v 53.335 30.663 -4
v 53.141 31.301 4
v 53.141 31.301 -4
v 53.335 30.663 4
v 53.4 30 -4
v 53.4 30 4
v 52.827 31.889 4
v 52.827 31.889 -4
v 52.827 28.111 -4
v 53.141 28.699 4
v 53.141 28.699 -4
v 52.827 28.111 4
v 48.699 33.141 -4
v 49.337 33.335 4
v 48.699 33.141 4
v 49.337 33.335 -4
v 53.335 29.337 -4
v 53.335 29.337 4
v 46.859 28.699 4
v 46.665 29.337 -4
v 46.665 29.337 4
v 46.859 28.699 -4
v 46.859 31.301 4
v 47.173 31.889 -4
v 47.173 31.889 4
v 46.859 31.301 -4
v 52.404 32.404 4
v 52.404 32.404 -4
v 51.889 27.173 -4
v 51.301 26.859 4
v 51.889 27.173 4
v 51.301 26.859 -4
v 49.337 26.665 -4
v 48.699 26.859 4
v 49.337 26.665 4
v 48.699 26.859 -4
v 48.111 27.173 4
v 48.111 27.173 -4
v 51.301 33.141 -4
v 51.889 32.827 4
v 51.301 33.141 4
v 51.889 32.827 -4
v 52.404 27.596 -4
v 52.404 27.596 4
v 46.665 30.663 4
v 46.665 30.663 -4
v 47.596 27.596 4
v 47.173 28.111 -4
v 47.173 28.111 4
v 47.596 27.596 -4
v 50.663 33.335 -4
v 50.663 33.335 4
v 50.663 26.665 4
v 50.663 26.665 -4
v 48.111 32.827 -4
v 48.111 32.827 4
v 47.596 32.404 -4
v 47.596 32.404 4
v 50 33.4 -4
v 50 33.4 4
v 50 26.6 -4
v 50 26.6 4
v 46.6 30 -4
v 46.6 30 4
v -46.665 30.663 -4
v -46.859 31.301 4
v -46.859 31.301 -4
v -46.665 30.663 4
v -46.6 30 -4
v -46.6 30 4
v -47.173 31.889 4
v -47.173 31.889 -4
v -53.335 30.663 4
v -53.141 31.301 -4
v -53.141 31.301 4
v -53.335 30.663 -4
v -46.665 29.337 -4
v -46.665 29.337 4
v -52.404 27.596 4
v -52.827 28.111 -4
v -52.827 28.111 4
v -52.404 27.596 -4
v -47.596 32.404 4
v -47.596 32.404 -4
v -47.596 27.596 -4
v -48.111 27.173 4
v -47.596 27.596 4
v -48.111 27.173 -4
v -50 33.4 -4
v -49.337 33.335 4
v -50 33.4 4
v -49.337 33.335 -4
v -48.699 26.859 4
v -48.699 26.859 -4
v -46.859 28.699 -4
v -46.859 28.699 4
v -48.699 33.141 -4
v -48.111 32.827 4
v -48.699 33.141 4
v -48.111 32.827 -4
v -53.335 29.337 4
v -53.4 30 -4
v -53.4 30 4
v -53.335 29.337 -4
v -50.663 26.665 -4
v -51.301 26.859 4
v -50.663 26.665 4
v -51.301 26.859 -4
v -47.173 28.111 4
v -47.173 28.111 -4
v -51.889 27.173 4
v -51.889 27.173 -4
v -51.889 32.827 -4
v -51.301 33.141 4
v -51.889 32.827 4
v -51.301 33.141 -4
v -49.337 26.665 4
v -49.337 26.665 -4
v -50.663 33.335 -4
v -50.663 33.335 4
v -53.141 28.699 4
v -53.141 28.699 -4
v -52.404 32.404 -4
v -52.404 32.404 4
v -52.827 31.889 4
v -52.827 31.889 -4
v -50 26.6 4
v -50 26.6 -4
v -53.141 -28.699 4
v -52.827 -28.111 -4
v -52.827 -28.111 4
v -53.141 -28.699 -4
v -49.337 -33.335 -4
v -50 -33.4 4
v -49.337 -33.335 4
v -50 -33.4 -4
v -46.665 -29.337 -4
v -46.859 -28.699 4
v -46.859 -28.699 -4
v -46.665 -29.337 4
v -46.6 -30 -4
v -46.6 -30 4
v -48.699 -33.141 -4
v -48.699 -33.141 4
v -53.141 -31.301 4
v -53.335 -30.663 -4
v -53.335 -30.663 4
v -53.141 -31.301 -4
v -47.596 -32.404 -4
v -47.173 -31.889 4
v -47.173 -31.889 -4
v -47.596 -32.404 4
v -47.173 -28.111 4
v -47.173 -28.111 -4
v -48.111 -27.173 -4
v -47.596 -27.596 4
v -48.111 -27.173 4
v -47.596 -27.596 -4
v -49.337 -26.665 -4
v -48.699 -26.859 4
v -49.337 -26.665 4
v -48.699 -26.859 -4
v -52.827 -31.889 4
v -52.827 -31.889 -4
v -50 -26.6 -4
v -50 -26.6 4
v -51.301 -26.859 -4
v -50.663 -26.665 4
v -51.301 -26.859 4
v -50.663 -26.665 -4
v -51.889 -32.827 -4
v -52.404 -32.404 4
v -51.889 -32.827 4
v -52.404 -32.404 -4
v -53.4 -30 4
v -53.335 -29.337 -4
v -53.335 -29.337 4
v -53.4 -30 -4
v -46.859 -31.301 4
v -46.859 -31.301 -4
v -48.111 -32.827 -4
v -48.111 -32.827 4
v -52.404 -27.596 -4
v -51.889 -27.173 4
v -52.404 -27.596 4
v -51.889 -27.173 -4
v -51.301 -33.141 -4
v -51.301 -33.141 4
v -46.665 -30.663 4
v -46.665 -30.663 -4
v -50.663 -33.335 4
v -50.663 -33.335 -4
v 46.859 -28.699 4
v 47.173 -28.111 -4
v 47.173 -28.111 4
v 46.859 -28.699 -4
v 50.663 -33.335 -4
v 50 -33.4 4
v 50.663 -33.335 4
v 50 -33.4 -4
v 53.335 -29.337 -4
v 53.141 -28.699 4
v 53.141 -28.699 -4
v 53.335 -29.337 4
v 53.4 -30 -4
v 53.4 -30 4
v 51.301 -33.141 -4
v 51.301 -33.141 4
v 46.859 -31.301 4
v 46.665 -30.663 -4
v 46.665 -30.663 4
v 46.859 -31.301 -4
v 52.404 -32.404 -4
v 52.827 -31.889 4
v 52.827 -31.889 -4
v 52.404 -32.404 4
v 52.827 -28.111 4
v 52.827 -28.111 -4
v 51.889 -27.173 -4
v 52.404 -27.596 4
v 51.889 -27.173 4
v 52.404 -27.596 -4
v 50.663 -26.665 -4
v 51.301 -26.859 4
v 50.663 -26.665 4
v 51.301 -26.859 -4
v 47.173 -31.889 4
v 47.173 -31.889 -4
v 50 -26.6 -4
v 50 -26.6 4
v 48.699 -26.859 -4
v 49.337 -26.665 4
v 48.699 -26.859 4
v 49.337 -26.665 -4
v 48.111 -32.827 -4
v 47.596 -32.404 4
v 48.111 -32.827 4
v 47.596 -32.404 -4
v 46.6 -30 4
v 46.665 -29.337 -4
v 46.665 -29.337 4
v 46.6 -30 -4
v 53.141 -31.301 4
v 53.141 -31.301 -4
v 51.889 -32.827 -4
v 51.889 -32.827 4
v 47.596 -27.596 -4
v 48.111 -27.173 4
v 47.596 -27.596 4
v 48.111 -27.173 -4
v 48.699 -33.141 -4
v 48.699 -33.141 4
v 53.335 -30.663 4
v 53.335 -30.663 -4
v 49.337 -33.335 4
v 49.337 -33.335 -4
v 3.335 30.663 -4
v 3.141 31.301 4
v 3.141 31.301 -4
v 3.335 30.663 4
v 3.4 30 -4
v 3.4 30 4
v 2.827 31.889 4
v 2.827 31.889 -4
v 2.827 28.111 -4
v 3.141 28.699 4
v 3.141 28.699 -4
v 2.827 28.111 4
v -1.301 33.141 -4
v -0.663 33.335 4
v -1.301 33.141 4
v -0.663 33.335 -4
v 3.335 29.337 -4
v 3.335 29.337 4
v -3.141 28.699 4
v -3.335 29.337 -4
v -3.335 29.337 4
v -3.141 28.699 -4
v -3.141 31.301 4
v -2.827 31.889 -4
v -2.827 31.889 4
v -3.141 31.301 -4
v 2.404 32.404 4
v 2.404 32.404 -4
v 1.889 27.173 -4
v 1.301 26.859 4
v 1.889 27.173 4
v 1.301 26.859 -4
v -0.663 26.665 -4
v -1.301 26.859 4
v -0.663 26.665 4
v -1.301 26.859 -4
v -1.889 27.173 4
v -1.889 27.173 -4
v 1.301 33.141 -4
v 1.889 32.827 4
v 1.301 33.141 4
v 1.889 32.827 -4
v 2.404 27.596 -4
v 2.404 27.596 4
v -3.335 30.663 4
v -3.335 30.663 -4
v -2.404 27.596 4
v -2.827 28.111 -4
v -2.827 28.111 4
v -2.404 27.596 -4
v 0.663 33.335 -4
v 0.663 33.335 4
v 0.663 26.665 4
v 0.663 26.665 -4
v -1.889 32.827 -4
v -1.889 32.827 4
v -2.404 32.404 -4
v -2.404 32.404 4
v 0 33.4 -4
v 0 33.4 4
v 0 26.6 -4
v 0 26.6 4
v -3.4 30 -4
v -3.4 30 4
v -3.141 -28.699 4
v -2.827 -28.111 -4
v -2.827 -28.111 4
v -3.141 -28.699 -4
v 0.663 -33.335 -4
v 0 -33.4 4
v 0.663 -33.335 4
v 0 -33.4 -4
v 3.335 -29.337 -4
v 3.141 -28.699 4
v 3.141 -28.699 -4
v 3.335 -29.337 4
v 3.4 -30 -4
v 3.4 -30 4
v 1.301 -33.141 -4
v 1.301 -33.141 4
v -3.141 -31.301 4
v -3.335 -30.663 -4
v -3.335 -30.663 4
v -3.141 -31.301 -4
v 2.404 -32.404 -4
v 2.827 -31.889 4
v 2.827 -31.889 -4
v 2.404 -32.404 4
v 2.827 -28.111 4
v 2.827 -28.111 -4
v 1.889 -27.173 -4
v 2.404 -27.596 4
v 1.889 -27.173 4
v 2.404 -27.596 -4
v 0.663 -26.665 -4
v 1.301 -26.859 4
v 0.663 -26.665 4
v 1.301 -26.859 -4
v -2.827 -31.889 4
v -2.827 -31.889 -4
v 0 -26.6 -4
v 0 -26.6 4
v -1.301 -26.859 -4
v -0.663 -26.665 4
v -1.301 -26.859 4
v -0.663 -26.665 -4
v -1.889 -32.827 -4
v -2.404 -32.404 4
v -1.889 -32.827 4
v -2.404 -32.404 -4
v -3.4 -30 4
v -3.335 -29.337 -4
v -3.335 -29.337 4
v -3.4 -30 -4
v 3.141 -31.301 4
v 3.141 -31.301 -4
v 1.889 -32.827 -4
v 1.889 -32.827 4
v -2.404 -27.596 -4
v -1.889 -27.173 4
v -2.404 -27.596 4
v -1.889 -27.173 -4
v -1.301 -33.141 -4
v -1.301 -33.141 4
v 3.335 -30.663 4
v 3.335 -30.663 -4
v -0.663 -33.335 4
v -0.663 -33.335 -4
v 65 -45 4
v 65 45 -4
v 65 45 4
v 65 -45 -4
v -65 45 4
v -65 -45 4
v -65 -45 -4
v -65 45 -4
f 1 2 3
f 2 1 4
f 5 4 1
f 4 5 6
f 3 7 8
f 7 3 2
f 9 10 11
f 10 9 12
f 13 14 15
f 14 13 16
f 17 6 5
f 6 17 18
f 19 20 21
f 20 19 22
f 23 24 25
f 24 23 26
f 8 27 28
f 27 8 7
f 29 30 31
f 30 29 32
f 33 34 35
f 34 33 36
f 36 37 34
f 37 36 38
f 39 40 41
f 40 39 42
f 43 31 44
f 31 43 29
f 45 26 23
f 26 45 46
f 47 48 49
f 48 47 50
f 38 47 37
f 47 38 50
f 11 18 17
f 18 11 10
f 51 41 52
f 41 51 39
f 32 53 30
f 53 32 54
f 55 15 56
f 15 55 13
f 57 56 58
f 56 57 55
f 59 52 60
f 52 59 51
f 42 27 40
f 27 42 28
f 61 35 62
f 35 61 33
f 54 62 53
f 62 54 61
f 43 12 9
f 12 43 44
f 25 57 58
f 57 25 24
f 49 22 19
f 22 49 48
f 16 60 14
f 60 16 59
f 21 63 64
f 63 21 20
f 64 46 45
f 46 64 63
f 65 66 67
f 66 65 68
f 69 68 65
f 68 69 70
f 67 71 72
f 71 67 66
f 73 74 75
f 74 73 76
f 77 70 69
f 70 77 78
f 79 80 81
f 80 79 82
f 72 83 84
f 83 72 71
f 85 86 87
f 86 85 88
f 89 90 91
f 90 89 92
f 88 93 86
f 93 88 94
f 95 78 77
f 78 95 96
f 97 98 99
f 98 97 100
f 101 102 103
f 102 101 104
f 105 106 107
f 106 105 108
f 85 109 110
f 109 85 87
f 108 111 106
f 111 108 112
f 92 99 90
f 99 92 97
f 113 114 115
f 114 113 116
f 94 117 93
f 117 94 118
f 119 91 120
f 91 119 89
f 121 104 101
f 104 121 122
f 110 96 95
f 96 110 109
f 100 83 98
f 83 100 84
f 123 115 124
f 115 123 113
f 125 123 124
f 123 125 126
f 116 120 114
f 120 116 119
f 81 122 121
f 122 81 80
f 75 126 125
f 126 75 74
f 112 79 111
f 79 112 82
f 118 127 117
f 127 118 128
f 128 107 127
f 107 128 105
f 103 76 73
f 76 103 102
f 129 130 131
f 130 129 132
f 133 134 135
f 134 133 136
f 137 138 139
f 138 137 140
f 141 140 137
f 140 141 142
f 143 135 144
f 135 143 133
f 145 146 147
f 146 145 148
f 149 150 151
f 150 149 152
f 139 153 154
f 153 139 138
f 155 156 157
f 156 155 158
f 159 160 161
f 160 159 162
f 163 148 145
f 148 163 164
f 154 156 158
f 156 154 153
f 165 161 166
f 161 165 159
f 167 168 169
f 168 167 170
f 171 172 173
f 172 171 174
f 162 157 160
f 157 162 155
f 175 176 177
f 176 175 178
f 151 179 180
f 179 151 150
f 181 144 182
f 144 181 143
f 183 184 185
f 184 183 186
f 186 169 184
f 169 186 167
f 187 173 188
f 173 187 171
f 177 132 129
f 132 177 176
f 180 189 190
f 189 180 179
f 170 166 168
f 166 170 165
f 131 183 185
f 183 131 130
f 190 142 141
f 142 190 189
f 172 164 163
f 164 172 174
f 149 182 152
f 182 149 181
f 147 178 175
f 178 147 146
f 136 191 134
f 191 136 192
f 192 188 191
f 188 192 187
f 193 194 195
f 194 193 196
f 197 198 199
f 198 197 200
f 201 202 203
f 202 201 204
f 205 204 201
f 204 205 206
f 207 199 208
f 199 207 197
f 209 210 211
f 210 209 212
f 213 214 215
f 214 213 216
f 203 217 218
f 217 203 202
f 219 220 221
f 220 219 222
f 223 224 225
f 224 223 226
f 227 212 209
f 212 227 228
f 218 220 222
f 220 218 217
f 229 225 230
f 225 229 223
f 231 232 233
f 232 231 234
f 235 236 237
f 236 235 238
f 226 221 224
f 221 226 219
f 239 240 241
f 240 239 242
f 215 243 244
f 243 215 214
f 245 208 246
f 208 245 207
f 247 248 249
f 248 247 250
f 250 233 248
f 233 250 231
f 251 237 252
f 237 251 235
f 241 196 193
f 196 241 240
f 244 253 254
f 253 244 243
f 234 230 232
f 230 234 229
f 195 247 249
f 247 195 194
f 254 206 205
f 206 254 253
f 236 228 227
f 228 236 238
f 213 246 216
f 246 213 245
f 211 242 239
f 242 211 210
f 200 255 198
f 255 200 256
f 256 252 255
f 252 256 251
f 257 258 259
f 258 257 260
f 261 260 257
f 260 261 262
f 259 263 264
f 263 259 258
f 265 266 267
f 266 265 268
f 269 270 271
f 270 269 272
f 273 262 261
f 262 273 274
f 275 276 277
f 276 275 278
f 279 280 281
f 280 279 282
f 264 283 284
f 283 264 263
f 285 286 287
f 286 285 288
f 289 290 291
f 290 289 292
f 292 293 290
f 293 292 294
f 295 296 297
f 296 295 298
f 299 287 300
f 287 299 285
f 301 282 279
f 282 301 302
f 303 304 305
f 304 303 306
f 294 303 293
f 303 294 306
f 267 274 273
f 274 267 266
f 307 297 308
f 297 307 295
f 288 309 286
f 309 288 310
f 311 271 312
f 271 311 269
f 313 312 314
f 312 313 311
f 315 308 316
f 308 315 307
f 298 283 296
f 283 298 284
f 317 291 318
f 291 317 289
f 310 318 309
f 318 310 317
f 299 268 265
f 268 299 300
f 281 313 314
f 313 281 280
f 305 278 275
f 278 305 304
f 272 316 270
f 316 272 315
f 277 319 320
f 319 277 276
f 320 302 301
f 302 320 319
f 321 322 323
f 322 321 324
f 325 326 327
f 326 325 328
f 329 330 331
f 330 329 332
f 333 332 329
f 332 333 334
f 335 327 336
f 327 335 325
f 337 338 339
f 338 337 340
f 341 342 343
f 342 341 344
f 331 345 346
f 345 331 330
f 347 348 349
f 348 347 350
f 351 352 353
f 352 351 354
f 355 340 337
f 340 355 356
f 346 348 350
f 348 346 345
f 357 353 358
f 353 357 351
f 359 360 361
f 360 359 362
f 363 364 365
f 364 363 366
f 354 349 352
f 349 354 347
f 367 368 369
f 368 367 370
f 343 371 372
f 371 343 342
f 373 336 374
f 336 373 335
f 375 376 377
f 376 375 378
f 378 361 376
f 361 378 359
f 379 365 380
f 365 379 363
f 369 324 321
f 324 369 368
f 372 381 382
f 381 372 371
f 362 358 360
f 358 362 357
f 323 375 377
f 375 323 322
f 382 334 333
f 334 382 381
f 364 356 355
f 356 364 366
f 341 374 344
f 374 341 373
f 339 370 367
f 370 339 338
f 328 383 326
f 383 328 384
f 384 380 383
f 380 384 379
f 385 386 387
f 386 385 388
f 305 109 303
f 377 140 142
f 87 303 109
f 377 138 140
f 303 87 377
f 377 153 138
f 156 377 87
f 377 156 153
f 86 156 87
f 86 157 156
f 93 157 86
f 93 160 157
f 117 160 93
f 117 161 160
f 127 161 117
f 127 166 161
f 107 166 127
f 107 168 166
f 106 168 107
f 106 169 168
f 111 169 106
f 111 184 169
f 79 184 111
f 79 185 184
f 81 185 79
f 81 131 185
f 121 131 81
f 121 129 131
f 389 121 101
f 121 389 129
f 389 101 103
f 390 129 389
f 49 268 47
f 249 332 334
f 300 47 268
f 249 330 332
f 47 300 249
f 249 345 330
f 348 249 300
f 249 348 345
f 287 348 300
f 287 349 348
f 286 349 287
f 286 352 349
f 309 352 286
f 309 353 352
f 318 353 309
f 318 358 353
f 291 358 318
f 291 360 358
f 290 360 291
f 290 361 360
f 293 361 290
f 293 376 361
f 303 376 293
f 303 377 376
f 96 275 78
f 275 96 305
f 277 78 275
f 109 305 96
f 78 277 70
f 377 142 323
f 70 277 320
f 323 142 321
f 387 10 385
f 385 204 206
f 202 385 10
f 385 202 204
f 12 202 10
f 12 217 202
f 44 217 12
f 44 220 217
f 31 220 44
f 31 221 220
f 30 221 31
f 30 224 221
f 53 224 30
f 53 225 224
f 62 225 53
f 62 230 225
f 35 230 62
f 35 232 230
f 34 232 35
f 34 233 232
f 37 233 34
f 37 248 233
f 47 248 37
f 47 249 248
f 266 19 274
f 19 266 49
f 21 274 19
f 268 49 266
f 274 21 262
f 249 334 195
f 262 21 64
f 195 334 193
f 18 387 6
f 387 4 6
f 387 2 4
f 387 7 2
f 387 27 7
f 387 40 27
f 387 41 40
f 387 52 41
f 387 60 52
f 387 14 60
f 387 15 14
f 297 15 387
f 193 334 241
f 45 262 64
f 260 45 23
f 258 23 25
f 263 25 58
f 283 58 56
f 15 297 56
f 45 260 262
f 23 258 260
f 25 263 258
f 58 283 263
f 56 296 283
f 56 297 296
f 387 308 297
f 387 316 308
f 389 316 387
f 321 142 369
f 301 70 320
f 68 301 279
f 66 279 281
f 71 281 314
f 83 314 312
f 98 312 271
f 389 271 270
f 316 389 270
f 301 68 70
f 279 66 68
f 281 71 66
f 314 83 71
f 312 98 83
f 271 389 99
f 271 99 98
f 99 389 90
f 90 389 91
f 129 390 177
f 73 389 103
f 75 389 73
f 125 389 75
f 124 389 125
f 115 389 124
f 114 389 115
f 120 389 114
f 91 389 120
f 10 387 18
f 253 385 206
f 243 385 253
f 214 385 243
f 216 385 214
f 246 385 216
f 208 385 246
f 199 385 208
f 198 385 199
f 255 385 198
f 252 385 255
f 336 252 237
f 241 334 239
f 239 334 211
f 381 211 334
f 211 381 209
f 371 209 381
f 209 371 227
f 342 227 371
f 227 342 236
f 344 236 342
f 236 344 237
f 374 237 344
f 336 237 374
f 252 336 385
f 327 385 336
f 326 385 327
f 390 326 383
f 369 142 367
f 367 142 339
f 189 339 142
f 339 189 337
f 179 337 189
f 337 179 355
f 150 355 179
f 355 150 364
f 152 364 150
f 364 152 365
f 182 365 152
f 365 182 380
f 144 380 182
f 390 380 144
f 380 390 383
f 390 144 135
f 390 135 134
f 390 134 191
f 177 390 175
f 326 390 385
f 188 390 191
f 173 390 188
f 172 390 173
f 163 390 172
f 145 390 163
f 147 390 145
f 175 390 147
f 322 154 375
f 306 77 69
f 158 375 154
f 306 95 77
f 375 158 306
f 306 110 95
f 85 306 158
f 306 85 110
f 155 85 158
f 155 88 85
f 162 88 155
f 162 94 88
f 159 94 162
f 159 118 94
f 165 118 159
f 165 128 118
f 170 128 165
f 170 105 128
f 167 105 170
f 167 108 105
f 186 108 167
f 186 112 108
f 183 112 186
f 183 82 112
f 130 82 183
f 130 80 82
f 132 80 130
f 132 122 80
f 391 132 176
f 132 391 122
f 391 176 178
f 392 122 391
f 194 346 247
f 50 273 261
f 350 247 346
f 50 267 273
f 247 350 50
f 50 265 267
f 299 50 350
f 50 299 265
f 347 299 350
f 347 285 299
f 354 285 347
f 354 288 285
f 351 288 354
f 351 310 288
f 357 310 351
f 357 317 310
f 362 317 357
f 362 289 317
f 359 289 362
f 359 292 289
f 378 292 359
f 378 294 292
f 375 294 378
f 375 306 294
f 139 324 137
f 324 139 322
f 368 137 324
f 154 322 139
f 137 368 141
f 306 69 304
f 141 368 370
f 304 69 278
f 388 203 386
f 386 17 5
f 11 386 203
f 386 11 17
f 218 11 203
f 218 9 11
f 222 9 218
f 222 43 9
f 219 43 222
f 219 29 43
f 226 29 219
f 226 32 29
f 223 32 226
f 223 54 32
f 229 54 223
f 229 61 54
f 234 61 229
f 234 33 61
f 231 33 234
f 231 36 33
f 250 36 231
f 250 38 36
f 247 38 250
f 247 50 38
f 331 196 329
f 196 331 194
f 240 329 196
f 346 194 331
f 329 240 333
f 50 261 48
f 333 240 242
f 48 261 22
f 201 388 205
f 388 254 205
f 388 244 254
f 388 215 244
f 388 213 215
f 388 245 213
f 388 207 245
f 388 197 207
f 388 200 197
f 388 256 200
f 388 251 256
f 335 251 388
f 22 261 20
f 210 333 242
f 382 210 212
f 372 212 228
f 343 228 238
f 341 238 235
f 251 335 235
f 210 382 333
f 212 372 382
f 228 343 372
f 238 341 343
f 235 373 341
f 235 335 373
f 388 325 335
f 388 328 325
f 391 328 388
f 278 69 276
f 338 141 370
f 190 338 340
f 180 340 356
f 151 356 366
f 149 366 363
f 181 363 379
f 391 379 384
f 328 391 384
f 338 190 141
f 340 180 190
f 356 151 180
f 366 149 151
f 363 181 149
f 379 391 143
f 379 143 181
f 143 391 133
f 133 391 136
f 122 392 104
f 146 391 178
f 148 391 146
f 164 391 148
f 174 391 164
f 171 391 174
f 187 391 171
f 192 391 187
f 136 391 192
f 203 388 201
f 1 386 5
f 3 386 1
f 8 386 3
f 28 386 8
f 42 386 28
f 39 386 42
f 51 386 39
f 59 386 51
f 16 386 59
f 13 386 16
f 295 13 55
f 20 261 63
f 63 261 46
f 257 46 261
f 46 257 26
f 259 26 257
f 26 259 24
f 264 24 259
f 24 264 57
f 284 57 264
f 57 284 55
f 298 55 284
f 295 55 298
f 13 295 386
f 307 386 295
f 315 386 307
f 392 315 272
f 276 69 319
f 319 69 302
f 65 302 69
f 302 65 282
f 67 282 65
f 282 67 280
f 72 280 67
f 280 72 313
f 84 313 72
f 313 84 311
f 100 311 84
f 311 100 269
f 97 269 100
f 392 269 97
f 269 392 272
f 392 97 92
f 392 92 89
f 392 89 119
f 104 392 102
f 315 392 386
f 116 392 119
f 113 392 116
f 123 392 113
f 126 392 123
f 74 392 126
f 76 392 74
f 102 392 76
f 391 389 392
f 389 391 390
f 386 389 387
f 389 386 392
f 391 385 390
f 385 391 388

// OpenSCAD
$fn = 32;

// ----------------------------------------------------------------------
// Corner plate 130 x 90 x 8
// 6 holes, centres taken from the edge offset
// ----------------------------------------------------------------------

// --- parameters (mm) ---
plate = [130, 90, 8];   // overall size (x, y, z)
holes = 6;              // number of holes the drawing asks for
bore_d = 6.6;           // nominal hole diameter from the drawing
print_allowance = 0.2;  // clearance added for printing
edge = 15;              // hole centre offset from the plate edge

// --- derived feature positions (mm) ---
hole_d = bore_d + print_allowance;  // = 6.8   hole diameter as printed
corner_x = plate[0] / 2 - edge;     // = 50   corner hole X
corner_y = plate[1] / 2 - edge;     // = 30   corner hole Y
feature_centers = [
  [corner_x, corner_y],
  [-corner_x, corner_y],
  [-corner_x, -corner_y],
  [corner_x, -corner_y],
  [0, corner_y],
  [0, -corner_y]
];   // hole centres the loop below drills

// plate outline, every hole drilled through with the same cutters
difference() {
  cube(plate, center = true);
  for (centre = feature_centers)
    translate([centre[0], centre[1], 0])
      cylinder(d = hole_d, h = plate[2] + 2, center = true);
}
